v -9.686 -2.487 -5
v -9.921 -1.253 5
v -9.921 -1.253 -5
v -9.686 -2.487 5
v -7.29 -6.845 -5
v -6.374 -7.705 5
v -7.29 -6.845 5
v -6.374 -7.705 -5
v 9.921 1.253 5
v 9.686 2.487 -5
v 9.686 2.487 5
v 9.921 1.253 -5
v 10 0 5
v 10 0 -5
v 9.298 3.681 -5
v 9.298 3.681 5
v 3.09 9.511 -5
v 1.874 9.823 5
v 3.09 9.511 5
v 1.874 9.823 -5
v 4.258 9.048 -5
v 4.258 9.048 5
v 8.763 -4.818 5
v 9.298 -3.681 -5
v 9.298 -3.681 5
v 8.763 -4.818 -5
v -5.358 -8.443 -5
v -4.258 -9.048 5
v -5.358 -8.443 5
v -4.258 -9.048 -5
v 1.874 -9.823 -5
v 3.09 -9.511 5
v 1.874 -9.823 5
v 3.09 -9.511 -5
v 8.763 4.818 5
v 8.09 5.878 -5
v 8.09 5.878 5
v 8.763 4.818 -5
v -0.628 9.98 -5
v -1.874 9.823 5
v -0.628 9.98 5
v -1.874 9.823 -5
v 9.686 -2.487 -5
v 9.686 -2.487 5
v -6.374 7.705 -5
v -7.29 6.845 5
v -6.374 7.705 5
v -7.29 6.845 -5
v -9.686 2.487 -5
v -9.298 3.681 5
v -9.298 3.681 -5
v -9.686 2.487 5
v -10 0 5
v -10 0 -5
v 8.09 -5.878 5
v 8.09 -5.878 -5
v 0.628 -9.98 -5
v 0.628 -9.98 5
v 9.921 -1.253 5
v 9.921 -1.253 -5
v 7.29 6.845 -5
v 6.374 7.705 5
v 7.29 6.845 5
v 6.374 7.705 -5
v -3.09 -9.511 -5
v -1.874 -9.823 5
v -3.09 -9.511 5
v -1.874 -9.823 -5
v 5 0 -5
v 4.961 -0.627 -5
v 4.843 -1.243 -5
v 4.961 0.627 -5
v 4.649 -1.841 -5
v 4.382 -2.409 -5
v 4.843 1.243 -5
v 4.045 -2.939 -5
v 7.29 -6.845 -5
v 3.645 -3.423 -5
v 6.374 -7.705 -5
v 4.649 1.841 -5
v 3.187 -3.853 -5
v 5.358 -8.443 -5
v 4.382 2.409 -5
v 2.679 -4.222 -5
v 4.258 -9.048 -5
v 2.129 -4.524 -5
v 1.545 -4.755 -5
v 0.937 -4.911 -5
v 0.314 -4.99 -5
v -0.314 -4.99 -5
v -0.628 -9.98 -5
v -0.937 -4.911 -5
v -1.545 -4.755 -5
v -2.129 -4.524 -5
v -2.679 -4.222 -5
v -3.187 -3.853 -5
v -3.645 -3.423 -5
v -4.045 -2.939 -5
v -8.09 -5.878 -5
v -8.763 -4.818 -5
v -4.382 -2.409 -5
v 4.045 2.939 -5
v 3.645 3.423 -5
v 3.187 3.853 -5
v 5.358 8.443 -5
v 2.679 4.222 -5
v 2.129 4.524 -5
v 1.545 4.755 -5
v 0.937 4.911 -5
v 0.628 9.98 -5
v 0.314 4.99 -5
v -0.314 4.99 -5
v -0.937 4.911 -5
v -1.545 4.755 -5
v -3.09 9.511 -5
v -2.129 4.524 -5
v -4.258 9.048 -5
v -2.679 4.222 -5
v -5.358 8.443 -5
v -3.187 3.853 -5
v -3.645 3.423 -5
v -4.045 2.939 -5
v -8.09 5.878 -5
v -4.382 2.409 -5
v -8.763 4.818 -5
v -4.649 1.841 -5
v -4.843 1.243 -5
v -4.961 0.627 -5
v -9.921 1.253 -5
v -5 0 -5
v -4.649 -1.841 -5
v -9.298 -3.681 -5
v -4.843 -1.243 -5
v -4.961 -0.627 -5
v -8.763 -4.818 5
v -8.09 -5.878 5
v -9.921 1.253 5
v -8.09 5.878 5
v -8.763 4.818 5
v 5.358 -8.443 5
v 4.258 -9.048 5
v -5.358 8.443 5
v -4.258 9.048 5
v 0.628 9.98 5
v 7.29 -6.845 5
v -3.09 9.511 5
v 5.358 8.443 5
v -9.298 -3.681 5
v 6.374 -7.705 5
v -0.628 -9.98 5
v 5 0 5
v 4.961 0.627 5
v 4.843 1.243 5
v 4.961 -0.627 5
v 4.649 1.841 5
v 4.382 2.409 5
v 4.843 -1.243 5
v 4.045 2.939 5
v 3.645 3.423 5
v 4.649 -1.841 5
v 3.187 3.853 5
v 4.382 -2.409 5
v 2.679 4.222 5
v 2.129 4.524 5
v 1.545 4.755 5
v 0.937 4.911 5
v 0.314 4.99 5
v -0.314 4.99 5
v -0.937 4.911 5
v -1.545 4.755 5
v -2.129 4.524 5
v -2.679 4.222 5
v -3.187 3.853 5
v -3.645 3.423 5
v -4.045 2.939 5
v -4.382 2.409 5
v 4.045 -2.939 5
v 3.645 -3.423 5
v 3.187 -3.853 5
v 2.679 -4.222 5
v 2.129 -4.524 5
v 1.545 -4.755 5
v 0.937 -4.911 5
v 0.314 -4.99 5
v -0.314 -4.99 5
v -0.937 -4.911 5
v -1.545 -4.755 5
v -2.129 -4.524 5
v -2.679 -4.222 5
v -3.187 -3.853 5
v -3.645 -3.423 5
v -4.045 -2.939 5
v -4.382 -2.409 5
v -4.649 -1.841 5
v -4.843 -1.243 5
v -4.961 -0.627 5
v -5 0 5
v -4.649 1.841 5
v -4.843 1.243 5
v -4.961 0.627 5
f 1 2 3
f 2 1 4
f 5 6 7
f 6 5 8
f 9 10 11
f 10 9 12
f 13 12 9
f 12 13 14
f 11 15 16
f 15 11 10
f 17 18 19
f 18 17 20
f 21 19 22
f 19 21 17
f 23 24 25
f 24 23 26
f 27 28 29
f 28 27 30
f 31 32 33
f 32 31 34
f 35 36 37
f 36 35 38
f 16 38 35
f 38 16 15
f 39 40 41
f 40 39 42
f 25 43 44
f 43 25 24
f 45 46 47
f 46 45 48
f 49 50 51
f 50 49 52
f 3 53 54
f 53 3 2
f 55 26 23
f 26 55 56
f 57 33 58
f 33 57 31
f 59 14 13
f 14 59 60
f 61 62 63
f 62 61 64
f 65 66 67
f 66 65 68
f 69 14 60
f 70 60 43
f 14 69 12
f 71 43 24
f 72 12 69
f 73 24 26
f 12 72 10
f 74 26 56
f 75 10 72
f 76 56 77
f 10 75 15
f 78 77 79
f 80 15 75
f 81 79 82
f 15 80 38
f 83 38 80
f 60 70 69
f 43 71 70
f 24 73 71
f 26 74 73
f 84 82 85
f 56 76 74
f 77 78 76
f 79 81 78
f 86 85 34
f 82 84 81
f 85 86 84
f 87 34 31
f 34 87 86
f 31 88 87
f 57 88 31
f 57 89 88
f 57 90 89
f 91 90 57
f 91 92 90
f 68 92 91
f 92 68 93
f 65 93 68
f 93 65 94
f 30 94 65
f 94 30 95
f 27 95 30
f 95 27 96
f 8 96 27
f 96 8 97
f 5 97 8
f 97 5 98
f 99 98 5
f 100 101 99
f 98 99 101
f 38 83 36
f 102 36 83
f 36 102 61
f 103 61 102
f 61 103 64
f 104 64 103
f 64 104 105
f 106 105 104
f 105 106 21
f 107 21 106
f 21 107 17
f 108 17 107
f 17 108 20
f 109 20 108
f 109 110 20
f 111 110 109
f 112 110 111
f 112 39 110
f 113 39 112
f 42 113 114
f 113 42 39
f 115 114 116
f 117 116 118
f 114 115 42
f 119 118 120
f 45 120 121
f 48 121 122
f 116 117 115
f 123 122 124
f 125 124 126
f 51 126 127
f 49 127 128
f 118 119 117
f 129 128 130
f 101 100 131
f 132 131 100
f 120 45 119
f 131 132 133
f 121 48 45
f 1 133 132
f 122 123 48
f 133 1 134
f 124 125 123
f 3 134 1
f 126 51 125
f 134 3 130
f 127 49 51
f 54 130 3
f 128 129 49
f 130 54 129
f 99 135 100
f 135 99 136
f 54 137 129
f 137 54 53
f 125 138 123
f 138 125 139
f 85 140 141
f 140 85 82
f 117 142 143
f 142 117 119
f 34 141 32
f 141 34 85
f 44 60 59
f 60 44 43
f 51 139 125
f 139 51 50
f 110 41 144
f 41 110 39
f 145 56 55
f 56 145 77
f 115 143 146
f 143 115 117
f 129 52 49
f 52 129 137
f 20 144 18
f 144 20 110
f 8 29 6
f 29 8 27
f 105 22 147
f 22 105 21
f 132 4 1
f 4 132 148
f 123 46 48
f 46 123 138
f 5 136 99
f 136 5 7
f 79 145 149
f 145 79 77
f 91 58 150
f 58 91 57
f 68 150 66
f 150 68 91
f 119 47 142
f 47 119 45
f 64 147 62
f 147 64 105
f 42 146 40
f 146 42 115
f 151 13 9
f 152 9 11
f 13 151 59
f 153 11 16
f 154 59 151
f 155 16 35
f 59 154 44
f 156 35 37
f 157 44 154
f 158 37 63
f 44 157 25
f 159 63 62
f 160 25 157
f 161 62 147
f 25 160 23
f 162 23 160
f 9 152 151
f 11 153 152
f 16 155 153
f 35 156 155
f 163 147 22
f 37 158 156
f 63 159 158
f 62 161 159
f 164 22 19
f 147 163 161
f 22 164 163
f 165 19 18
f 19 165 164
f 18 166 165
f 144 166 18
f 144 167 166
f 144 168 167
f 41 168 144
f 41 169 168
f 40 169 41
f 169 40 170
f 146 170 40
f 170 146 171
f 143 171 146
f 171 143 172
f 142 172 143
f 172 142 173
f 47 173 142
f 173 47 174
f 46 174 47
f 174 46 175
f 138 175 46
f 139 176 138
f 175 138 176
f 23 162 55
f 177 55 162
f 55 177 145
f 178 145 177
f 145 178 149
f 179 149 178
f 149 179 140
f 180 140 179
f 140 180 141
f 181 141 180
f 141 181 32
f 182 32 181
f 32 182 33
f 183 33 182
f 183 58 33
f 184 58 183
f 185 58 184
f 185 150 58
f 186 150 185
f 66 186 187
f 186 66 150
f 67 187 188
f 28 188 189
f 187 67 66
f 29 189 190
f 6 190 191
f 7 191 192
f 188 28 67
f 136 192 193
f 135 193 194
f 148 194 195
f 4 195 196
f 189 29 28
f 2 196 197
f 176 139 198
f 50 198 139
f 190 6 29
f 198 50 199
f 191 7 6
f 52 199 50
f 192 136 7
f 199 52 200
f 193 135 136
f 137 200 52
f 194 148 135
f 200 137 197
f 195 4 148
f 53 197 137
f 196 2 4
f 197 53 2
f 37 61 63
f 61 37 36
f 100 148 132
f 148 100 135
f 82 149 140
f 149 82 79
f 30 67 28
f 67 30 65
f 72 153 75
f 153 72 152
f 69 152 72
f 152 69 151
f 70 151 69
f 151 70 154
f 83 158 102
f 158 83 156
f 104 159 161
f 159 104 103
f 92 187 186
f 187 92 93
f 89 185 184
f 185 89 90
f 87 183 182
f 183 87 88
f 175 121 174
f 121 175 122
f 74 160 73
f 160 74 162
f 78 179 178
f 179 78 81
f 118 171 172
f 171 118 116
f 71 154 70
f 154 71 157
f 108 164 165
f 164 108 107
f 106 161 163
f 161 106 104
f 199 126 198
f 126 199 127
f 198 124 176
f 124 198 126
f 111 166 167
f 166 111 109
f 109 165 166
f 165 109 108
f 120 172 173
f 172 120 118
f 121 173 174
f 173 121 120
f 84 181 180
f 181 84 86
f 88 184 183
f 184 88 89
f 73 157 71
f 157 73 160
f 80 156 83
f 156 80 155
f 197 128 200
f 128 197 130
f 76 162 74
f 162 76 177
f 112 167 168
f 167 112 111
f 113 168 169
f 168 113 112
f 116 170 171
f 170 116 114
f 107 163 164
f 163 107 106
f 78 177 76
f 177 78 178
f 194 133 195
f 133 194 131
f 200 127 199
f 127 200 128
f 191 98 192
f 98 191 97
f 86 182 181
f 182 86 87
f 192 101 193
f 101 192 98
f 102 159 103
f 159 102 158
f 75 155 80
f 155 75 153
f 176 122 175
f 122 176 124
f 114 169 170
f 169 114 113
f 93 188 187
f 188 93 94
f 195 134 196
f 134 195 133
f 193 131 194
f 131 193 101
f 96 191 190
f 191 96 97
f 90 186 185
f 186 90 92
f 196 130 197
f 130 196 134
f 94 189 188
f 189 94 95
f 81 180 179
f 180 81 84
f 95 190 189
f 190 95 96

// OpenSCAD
$fn=50;
module test_part() {
    difference() {
        cylinder(h=10, r=10, center=true);
        cylinder(h=12, r=5, center=true);
    }
}
test_part();
